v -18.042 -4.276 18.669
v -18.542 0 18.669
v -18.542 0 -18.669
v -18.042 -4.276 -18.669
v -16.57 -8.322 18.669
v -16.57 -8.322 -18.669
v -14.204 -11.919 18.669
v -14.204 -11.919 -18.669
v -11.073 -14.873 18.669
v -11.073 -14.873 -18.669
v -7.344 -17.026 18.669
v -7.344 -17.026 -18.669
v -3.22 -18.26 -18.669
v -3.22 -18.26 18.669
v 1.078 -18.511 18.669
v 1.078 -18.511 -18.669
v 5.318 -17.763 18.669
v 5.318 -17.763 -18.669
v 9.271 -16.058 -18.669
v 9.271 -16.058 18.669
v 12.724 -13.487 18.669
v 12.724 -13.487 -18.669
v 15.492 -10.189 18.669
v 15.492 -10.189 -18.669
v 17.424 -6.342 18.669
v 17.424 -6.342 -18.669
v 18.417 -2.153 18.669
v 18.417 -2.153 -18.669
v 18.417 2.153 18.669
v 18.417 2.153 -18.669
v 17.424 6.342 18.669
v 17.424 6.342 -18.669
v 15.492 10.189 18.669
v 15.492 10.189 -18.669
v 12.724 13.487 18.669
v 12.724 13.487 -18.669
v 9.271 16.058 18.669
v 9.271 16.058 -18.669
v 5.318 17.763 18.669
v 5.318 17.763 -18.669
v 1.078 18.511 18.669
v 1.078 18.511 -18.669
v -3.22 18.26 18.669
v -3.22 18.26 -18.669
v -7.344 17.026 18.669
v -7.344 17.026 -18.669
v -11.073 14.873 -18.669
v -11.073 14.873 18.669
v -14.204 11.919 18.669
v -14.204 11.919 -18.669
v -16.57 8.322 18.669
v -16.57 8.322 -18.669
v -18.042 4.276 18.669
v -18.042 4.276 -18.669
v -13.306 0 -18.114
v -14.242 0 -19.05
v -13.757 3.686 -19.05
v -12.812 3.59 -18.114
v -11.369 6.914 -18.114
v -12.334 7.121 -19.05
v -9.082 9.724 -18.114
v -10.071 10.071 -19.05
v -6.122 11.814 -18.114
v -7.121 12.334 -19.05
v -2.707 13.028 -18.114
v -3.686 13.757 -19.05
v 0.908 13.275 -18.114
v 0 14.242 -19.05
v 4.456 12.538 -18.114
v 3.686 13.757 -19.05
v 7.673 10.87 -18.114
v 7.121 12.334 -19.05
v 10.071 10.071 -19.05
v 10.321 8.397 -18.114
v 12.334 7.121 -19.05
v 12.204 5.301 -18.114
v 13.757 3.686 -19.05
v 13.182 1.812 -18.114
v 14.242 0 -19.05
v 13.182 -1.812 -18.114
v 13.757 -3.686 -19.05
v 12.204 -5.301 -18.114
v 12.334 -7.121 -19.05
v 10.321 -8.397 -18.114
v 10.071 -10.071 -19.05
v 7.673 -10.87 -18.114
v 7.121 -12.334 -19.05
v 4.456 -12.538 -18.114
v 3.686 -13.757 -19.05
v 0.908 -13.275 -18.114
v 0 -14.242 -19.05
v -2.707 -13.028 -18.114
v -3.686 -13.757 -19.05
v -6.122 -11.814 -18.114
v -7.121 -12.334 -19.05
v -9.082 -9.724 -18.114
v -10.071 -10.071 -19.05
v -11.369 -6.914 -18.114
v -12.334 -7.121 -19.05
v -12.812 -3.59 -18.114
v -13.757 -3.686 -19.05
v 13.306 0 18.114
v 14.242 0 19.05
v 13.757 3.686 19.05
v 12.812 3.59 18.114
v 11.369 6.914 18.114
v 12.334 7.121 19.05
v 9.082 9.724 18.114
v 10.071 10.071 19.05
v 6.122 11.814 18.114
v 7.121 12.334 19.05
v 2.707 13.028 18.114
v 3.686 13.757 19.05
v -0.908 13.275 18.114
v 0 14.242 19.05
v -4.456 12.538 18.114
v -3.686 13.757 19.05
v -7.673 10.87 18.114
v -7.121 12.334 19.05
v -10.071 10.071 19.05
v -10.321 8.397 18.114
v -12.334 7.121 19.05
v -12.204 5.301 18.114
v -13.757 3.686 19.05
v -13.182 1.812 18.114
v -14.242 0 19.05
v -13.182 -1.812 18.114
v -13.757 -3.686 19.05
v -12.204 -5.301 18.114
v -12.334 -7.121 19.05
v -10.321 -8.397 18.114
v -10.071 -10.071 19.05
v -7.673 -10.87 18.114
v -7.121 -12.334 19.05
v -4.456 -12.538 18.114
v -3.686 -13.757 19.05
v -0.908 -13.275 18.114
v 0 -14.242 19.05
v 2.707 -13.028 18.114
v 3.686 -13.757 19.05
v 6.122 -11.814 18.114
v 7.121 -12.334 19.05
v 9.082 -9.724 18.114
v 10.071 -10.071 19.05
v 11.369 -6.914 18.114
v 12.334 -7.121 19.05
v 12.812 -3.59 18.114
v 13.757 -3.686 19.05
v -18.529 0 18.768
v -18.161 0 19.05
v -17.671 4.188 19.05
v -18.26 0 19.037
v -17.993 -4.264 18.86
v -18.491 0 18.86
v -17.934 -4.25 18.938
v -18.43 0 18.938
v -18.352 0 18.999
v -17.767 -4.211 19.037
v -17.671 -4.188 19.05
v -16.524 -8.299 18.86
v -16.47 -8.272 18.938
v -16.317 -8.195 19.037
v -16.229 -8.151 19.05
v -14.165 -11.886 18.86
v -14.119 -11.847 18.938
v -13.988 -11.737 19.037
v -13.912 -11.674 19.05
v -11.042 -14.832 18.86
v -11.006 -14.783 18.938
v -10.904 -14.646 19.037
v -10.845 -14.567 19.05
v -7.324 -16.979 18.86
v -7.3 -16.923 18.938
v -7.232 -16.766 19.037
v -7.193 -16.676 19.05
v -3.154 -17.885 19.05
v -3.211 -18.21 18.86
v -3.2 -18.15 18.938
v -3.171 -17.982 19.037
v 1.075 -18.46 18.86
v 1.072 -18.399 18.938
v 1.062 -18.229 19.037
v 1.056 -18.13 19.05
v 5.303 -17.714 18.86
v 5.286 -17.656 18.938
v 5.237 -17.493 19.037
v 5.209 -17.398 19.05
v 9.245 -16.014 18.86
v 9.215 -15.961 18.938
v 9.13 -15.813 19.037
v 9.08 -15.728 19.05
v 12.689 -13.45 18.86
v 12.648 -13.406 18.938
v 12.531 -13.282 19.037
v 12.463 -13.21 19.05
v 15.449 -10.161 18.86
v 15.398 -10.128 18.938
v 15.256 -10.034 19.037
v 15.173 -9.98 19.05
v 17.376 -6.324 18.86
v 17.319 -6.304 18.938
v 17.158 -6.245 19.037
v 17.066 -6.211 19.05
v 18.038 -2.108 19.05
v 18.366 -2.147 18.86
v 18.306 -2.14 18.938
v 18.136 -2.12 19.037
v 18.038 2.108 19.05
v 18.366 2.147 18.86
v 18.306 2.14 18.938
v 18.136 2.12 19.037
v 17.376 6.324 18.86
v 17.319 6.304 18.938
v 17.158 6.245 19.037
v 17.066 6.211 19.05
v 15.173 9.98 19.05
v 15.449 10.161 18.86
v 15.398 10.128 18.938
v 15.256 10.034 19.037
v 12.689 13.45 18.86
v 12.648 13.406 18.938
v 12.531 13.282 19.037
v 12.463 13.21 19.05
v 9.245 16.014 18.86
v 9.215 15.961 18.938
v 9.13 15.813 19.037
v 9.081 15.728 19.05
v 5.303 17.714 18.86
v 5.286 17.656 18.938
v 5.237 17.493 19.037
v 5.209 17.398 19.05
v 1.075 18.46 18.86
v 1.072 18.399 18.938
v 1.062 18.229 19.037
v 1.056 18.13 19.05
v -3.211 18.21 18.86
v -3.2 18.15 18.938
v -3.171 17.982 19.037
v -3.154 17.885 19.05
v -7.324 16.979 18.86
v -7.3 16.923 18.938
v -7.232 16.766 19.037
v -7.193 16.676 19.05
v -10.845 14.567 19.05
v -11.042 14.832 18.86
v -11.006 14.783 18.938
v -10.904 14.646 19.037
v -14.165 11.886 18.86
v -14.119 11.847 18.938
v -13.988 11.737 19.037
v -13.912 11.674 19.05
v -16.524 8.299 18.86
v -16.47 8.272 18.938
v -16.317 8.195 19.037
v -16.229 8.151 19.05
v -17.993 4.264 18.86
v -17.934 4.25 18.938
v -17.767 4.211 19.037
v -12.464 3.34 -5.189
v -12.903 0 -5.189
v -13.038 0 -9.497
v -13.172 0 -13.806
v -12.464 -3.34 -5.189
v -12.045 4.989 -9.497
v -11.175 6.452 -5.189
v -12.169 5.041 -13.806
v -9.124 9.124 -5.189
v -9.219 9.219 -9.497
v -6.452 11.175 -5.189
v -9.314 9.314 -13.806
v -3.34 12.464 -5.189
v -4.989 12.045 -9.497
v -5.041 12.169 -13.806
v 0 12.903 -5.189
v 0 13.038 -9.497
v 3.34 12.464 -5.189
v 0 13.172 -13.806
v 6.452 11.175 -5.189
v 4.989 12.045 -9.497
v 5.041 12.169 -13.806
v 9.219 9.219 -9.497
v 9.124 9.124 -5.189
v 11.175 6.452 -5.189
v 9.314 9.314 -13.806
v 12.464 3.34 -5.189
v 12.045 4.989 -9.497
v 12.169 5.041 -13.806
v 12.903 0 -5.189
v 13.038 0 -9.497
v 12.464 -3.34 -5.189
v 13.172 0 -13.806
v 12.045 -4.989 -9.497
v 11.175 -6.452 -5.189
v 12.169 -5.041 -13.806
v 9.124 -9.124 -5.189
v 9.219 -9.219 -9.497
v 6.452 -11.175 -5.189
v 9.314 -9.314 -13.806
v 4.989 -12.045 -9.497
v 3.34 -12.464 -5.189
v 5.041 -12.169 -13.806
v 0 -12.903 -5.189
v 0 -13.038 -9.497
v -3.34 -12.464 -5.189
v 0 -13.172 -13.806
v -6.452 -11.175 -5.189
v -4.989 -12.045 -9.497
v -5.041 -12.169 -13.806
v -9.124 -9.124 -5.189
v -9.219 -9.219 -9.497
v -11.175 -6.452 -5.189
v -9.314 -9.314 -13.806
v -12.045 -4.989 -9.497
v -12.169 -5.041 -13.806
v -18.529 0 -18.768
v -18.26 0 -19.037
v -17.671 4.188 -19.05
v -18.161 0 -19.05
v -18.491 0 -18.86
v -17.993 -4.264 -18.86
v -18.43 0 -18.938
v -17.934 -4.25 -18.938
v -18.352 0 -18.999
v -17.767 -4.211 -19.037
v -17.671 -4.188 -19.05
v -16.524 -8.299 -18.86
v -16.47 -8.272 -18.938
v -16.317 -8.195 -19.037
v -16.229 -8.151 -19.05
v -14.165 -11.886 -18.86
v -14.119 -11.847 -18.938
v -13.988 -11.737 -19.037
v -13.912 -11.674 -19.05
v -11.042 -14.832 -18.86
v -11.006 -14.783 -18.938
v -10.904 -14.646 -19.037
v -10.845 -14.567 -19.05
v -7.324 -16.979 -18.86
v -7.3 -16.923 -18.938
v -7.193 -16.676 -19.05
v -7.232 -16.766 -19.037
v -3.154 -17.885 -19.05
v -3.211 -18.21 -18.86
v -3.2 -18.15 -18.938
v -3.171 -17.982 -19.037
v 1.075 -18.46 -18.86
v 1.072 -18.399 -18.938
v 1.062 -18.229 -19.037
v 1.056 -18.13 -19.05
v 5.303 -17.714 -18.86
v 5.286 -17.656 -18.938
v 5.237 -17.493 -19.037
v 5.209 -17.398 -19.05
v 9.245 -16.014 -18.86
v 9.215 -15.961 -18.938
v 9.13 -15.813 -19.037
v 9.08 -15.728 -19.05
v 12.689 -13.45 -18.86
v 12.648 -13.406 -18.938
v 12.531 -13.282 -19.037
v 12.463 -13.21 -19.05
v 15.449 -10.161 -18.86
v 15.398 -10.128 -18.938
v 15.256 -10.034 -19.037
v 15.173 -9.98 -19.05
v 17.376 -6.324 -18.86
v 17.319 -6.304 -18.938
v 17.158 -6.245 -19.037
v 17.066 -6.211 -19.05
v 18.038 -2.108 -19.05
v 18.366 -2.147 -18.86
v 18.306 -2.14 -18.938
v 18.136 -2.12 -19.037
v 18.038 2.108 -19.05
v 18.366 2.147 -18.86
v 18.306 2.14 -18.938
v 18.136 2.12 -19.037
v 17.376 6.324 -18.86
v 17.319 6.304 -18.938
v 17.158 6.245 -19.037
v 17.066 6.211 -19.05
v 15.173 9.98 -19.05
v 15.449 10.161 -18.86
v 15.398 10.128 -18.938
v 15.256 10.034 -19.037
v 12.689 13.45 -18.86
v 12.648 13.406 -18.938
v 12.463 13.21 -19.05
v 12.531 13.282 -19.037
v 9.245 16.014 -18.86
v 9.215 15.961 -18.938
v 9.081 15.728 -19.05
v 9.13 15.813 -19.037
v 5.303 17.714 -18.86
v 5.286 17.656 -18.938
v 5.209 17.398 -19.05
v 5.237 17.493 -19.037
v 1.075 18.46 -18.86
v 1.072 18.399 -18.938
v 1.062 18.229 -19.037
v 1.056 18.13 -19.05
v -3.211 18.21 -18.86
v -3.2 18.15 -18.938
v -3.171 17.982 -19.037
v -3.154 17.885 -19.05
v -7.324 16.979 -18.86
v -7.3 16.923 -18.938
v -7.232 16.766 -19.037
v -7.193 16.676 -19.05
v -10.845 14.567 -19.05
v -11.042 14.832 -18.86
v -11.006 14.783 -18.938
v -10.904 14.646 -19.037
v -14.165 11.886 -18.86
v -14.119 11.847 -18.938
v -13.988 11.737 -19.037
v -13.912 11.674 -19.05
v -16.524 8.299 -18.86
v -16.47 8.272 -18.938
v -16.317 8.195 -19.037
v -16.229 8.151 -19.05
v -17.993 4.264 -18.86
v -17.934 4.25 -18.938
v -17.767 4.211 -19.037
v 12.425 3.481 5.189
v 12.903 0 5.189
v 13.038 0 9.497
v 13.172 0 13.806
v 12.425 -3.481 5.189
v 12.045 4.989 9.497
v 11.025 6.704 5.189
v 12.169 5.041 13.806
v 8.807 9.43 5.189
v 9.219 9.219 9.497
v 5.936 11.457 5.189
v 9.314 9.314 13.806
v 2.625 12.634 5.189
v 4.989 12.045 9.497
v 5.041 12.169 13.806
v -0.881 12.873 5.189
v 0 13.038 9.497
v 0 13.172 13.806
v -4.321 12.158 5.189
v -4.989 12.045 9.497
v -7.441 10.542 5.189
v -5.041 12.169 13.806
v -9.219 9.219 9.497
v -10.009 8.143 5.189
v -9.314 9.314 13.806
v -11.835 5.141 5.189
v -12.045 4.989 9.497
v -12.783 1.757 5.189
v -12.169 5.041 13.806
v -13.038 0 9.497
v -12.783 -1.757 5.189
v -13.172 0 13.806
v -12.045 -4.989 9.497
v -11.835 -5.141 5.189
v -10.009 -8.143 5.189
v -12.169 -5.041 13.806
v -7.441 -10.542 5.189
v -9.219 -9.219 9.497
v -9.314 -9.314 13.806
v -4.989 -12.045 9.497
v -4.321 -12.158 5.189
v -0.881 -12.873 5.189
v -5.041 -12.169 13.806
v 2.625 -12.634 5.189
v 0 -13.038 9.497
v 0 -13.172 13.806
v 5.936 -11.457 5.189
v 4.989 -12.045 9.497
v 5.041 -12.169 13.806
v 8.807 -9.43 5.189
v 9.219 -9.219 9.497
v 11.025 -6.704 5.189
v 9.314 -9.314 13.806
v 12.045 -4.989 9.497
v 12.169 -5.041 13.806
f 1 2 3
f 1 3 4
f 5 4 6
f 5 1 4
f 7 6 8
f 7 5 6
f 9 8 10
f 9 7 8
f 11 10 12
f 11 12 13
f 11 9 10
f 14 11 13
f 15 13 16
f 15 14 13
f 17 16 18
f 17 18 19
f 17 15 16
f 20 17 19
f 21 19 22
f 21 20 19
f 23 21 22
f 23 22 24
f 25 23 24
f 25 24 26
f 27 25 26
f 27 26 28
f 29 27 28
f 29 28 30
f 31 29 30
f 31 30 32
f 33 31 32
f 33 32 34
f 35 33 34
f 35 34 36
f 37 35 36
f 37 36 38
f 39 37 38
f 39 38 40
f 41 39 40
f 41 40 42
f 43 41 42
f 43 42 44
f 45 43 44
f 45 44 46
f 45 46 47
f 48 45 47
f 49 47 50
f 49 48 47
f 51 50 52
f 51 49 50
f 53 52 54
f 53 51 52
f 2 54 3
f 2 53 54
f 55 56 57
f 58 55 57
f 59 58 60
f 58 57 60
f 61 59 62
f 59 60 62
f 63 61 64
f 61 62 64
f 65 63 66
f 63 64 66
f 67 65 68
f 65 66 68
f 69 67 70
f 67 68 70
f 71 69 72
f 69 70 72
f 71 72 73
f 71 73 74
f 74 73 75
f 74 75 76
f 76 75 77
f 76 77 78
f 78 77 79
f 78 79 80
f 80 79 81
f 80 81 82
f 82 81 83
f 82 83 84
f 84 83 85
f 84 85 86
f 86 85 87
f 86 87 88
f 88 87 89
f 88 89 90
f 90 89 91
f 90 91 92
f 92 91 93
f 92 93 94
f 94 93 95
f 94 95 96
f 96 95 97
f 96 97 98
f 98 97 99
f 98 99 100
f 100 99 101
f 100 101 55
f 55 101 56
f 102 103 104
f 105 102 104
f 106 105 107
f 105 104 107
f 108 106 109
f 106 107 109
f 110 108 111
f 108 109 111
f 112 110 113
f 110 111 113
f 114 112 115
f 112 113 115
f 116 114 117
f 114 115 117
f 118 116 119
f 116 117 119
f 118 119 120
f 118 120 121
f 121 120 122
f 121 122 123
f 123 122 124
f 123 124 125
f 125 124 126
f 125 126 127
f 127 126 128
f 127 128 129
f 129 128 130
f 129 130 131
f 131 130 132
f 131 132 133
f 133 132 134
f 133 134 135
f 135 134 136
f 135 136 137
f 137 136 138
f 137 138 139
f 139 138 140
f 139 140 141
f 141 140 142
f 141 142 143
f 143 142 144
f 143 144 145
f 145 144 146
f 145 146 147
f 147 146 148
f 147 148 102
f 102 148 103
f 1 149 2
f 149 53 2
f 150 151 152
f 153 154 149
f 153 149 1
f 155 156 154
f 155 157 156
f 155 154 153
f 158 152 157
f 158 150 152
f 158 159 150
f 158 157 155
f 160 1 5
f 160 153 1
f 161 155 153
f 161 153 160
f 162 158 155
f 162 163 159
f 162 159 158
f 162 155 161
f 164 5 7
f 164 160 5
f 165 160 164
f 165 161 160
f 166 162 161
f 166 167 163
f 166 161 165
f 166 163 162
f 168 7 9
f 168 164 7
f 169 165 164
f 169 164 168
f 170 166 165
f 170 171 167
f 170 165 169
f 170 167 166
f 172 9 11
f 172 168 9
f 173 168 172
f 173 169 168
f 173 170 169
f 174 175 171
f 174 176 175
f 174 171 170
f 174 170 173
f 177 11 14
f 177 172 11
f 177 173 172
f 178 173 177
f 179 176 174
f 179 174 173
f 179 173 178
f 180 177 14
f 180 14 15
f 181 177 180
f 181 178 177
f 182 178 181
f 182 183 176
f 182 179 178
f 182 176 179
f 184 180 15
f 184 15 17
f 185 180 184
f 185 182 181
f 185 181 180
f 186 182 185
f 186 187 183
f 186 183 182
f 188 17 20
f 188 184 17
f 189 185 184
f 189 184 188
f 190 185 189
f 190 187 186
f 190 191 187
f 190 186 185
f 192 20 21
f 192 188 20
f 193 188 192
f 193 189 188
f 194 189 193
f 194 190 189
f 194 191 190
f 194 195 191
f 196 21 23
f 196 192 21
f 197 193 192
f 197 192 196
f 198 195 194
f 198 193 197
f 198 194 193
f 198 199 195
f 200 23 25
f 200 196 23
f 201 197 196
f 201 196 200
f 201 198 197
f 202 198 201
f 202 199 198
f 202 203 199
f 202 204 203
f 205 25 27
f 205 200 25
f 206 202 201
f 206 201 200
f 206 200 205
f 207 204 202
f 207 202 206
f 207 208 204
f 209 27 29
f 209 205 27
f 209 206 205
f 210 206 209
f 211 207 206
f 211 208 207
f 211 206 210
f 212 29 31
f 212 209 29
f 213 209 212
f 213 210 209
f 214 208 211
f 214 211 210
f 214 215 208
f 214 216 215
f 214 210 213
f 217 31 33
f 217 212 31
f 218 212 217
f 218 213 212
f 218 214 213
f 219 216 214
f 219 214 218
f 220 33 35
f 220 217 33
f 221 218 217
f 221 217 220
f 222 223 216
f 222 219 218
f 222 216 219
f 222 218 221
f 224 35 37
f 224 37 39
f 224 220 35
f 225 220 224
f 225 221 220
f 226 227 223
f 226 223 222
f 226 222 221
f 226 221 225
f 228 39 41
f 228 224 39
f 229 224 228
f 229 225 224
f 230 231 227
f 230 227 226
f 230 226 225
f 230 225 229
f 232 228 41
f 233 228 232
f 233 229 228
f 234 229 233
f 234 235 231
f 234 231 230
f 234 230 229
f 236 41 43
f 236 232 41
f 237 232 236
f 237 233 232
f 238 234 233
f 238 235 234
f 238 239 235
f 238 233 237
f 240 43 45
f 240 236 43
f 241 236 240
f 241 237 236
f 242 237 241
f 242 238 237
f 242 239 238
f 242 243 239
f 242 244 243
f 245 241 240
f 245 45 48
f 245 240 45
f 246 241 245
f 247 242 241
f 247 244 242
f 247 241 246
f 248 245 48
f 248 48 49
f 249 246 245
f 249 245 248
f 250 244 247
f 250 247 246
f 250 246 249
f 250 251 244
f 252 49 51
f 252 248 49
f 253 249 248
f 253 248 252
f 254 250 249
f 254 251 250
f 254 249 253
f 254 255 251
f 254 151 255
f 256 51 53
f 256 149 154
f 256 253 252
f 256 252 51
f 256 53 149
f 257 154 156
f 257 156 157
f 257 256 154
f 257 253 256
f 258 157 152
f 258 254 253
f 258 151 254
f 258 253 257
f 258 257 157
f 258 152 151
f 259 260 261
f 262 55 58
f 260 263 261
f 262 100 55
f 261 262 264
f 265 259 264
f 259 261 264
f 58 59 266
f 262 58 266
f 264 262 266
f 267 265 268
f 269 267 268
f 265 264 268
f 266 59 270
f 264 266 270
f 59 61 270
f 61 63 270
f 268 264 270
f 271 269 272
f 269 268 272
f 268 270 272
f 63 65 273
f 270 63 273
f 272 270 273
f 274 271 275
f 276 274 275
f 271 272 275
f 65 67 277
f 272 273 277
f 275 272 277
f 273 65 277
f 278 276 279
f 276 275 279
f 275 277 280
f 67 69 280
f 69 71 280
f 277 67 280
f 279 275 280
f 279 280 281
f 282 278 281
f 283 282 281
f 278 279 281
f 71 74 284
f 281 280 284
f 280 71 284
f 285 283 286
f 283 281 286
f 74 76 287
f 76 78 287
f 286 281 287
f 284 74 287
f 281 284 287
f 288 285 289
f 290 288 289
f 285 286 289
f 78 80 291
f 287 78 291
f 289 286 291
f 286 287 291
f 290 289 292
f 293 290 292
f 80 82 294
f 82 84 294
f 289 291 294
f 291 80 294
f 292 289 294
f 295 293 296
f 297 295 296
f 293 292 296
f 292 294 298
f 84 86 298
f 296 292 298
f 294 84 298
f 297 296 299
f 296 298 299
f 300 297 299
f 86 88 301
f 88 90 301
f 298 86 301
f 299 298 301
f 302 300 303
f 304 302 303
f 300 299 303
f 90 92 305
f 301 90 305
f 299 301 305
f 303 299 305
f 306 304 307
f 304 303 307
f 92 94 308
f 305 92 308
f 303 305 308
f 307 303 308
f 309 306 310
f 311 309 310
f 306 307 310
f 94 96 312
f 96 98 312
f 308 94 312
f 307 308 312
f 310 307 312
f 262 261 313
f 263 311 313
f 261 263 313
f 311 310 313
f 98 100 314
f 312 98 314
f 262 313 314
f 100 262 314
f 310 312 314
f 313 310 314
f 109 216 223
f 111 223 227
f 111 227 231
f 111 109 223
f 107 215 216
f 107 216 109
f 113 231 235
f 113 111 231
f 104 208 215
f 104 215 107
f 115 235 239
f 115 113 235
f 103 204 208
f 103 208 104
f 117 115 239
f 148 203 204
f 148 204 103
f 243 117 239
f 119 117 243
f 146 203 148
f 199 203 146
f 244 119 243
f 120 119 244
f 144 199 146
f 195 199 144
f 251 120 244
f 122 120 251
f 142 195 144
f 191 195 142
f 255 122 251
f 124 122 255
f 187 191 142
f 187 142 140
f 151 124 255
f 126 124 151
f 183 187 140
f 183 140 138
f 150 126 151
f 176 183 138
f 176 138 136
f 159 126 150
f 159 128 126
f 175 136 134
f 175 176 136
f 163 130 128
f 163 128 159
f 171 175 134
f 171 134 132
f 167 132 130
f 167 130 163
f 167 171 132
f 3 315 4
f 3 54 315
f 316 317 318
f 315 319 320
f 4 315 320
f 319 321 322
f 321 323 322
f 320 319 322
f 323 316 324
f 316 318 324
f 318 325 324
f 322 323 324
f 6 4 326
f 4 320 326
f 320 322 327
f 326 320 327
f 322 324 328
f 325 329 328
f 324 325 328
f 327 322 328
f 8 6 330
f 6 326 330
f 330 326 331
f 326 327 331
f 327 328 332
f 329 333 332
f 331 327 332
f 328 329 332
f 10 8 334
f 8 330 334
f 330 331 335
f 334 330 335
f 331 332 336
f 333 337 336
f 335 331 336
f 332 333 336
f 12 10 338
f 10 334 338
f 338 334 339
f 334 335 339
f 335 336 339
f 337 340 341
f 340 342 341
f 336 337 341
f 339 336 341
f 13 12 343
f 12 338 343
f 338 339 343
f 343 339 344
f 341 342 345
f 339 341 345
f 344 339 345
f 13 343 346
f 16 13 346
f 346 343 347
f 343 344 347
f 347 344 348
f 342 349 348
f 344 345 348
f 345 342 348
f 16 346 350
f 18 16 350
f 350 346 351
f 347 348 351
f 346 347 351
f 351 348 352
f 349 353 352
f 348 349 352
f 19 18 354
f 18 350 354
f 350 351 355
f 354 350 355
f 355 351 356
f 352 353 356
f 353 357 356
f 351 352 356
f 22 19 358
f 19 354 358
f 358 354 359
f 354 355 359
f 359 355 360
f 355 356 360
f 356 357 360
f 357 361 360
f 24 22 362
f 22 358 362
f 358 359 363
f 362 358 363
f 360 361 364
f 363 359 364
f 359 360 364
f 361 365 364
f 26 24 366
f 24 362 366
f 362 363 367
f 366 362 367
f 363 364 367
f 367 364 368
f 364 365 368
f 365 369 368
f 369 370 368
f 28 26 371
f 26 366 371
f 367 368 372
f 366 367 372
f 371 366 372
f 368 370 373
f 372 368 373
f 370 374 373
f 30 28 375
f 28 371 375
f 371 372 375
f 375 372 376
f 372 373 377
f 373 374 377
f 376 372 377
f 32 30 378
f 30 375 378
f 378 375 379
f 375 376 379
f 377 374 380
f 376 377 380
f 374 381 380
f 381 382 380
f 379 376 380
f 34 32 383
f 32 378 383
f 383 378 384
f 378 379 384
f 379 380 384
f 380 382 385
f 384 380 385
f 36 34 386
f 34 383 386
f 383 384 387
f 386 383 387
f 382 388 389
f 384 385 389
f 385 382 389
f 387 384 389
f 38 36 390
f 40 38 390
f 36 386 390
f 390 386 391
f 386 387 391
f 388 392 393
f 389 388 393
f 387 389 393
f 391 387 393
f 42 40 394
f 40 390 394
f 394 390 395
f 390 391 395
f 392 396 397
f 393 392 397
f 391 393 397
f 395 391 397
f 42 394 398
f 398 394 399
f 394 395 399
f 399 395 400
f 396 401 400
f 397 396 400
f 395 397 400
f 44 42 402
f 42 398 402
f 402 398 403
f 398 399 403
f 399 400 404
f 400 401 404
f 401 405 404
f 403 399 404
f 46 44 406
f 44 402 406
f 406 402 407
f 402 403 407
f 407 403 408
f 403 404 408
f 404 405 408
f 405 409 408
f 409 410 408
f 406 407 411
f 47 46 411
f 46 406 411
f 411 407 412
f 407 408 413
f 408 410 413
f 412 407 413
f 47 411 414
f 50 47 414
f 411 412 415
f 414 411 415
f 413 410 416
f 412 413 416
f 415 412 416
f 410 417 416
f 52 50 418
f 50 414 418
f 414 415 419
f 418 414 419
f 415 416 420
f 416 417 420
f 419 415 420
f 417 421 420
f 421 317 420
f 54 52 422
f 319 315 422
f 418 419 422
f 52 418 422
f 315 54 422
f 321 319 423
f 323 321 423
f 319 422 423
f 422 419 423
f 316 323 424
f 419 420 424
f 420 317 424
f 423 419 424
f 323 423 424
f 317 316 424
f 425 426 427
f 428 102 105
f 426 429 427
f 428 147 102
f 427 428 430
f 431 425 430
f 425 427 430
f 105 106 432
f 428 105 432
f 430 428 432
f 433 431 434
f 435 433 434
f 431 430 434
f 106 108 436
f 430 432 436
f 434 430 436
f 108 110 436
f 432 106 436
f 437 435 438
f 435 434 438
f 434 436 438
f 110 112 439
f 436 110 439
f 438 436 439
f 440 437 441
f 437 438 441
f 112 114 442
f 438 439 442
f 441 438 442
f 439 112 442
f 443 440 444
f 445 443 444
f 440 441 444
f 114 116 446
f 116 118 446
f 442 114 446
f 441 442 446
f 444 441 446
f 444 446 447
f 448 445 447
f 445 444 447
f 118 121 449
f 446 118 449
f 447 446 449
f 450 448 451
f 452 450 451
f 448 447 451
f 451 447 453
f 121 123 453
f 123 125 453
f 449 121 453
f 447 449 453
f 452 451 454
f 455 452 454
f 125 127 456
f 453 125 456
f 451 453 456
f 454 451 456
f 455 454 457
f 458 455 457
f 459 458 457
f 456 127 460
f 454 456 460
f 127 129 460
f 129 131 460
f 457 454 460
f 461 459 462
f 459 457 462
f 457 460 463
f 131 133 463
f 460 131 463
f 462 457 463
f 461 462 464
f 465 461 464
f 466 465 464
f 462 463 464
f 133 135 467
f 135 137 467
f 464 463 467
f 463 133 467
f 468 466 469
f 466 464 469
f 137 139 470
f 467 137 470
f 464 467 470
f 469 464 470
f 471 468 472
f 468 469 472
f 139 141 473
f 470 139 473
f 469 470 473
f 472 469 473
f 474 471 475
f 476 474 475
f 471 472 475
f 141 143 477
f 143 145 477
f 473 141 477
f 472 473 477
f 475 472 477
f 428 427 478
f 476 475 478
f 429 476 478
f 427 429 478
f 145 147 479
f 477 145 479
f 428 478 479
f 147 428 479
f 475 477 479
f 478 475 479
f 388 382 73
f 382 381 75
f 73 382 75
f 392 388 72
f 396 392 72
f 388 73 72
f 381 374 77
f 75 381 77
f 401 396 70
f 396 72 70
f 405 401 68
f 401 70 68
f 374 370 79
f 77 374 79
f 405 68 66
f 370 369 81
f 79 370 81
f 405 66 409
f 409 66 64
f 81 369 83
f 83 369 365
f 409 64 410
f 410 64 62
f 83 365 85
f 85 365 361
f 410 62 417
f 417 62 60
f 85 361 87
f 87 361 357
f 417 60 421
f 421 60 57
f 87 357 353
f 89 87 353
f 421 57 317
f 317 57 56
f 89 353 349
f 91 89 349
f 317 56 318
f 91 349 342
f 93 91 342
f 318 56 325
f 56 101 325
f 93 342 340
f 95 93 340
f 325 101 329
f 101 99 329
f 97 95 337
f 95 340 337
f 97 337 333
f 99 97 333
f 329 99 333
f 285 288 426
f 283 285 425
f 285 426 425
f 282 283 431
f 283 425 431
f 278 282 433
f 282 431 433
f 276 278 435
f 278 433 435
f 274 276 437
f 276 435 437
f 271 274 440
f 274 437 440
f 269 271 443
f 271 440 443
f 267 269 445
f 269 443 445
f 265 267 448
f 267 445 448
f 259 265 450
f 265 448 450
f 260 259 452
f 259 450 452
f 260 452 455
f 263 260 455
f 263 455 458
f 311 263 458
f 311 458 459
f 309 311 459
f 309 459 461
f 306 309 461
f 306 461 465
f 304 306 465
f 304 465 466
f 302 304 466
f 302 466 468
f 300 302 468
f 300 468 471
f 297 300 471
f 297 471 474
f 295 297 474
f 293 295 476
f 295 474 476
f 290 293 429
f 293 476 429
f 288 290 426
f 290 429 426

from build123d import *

# Parameters (mm, degrees)
SKETCH1_R                   = 18.542
EXTRUDE1_DEPTH              = 19.05
SKETCH2_R                   = 13.335
CUT_EXTRUDE1_DEPTH          = 13.86078
CUT_EXTRUDE1_DRAFT          = -1.783333333
SKETCH5_R                   = 14.242142857
CUT_EXTRUDE3_DEPTH          = 3.175
CUT_EXTRUDE3_DRAFT          = -45
CIRPATTERN1_COPY_1_SKETCH_R = 13.335
CIRPATTERN1_COPY_1_DEPTH    = 13.86078
CIRPATTERN1_COPY_1_DRAFT    = -1.783333333
CIRPATTERN1_COPY_2_SKETCH_R = 14.242142857
CIRPATTERN1_COPY_2_DEPTH    = 3.175
CIRPATTERN1_COPY_2_DRAFT    = -45
FILLET1_R                   = 0.381
SKETCH8_R                   = 12.903443323
CUT_EXTRUDE5_DEPTH          = 36.709260955


with BuildPart() as part:
    # Sketch1 → Extrude1 (new, symmetric)
    with BuildSketch(Plane.XY):
        Circle(SKETCH1_R)
    extrude(amount=EXTRUDE1_DEPTH, both=True)


with BuildPart() as cut_extrude1_tool:
    # Sketch2 → Cut-Extrude1 (with draft: the straight prism first)
    with BuildSketch(Plane.XY.offset(19.05)):
        Circle(SKETCH2_R)
    extrude(amount=-CUT_EXTRUDE1_DEPTH)
    # Cut-Extrude1: the draft: its side faces are tilted about the plane it starts from
    cut_extrude1_sides = [cut_extrude1_tool.faces().sort_by_distance(p)[0] for p in [
        (-13.335, 0, 12.11961),
    ]]
    draft(cut_extrude1_sides, Plane.XY.offset(19.05), CUT_EXTRUDE1_DRAFT)


with BuildPart() as part_1:
    add(part.part)

    # Cut-Extrude1: cut by cut_extrude1_tool
    add(cut_extrude1_tool.part, mode=Mode.SUBTRACT)


with BuildPart() as cut_extrude3_tool:
    # Sketch5 → Cut-Extrude3 (with draft: the straight prism first)
    with BuildSketch(Plane.XY.offset(19.05)):
        Circle(SKETCH5_R)
    extrude(amount=-CUT_EXTRUDE3_DEPTH)
    # Cut-Extrude3: the draft: its side faces are tilted about the plane it starts from
    cut_extrude3_sides = [cut_extrude3_tool.faces().sort_by_distance(p)[0] for p in [
        (-14.242142857, 0, 17.4625),
    ]]
    draft(cut_extrude3_sides, Plane.XY.offset(19.05), CUT_EXTRUDE3_DRAFT)


with BuildPart() as part_2:
    add(part_1.part)

    # Cut-Extrude3: cut by cut_extrude3_tool
    add(cut_extrude3_tool.part, mode=Mode.SUBTRACT)


with BuildPart() as cirpattern1_copy_1_tool:
    # CirPattern1 copy 1 sketch → CirPattern1 copy 1 (with draft: the straight prism first)
    with BuildSketch(Plane(origin=(0, 0, -19.05), x_dir=(-1, 0, 0), z_dir=(0, 0, -1))):
        Circle(CIRPATTERN1_COPY_1_SKETCH_R)
    extrude(amount=-CIRPATTERN1_COPY_1_DEPTH)
    # CirPattern1 copy 1: the draft: its side faces are tilted about the plane it starts from
    cirpattern1_copy_1_sides = [cirpattern1_copy_1_tool.faces().sort_by_distance(p)[0] for p in [
        (13.335, 0, -12.11961),
    ]]
    draft(cirpattern1_copy_1_sides, Plane(origin=(0, 0, -19.05), x_dir=(-1, 0, 0), z_dir=(0, 0, -1)), CIRPATTERN1_COPY_1_DRAFT)


with BuildPart() as part_3:
    add(part_2.part)

    # CirPattern1 copy 1: cut by cirpattern1_copy_1_tool
    add(cirpattern1_copy_1_tool.part, mode=Mode.SUBTRACT)


with BuildPart() as cirpattern1_copy_2_tool:
    # CirPattern1 copy 2 sketch → CirPattern1 copy 2 (with draft: the straight prism first)
    with BuildSketch(Plane(origin=(0, 0, -19.05), x_dir=(-1, 0, 0), z_dir=(0, 0, -1))):
        Circle(CIRPATTERN1_COPY_2_SKETCH_R)
    extrude(amount=-CIRPATTERN1_COPY_2_DEPTH)
    # CirPattern1 copy 2: the draft: its side faces are tilted about the plane it starts from
    cirpattern1_copy_2_sides = [cirpattern1_copy_2_tool.faces().sort_by_distance(p)[0] for p in [
        (14.242142857, 0, -17.4625),
    ]]
    draft(cirpattern1_copy_2_sides, Plane(origin=(0, 0, -19.05), x_dir=(-1, 0, 0), z_dir=(0, 0, -1)), CIRPATTERN1_COPY_2_DRAFT)


with BuildPart() as part_4:
    add(part_3.part)

    # CirPattern1 copy 2: cut by cirpattern1_copy_2_tool
    add(cirpattern1_copy_2_tool.part, mode=Mode.SUBTRACT)

    # Fillet1
    fillet1_edges = [part_4.edges().sort_by_distance(p)[0] for p in [
        (-18.542, 0, -19.05),
        (-18.542, 0, 19.05),
    ]]
    fillet(fillet1_edges, radius=FILLET1_R)

    # Sketch8 → Cut-Extrude5 (cut, through all)
    with BuildSketch(Plane.XY.offset(5.18922)):
        Circle(SKETCH8_R)
    extrude(amount=-CUT_EXTRUDE5_DEPTH, mode=Mode.SUBTRACT)


solid = part_4.part
